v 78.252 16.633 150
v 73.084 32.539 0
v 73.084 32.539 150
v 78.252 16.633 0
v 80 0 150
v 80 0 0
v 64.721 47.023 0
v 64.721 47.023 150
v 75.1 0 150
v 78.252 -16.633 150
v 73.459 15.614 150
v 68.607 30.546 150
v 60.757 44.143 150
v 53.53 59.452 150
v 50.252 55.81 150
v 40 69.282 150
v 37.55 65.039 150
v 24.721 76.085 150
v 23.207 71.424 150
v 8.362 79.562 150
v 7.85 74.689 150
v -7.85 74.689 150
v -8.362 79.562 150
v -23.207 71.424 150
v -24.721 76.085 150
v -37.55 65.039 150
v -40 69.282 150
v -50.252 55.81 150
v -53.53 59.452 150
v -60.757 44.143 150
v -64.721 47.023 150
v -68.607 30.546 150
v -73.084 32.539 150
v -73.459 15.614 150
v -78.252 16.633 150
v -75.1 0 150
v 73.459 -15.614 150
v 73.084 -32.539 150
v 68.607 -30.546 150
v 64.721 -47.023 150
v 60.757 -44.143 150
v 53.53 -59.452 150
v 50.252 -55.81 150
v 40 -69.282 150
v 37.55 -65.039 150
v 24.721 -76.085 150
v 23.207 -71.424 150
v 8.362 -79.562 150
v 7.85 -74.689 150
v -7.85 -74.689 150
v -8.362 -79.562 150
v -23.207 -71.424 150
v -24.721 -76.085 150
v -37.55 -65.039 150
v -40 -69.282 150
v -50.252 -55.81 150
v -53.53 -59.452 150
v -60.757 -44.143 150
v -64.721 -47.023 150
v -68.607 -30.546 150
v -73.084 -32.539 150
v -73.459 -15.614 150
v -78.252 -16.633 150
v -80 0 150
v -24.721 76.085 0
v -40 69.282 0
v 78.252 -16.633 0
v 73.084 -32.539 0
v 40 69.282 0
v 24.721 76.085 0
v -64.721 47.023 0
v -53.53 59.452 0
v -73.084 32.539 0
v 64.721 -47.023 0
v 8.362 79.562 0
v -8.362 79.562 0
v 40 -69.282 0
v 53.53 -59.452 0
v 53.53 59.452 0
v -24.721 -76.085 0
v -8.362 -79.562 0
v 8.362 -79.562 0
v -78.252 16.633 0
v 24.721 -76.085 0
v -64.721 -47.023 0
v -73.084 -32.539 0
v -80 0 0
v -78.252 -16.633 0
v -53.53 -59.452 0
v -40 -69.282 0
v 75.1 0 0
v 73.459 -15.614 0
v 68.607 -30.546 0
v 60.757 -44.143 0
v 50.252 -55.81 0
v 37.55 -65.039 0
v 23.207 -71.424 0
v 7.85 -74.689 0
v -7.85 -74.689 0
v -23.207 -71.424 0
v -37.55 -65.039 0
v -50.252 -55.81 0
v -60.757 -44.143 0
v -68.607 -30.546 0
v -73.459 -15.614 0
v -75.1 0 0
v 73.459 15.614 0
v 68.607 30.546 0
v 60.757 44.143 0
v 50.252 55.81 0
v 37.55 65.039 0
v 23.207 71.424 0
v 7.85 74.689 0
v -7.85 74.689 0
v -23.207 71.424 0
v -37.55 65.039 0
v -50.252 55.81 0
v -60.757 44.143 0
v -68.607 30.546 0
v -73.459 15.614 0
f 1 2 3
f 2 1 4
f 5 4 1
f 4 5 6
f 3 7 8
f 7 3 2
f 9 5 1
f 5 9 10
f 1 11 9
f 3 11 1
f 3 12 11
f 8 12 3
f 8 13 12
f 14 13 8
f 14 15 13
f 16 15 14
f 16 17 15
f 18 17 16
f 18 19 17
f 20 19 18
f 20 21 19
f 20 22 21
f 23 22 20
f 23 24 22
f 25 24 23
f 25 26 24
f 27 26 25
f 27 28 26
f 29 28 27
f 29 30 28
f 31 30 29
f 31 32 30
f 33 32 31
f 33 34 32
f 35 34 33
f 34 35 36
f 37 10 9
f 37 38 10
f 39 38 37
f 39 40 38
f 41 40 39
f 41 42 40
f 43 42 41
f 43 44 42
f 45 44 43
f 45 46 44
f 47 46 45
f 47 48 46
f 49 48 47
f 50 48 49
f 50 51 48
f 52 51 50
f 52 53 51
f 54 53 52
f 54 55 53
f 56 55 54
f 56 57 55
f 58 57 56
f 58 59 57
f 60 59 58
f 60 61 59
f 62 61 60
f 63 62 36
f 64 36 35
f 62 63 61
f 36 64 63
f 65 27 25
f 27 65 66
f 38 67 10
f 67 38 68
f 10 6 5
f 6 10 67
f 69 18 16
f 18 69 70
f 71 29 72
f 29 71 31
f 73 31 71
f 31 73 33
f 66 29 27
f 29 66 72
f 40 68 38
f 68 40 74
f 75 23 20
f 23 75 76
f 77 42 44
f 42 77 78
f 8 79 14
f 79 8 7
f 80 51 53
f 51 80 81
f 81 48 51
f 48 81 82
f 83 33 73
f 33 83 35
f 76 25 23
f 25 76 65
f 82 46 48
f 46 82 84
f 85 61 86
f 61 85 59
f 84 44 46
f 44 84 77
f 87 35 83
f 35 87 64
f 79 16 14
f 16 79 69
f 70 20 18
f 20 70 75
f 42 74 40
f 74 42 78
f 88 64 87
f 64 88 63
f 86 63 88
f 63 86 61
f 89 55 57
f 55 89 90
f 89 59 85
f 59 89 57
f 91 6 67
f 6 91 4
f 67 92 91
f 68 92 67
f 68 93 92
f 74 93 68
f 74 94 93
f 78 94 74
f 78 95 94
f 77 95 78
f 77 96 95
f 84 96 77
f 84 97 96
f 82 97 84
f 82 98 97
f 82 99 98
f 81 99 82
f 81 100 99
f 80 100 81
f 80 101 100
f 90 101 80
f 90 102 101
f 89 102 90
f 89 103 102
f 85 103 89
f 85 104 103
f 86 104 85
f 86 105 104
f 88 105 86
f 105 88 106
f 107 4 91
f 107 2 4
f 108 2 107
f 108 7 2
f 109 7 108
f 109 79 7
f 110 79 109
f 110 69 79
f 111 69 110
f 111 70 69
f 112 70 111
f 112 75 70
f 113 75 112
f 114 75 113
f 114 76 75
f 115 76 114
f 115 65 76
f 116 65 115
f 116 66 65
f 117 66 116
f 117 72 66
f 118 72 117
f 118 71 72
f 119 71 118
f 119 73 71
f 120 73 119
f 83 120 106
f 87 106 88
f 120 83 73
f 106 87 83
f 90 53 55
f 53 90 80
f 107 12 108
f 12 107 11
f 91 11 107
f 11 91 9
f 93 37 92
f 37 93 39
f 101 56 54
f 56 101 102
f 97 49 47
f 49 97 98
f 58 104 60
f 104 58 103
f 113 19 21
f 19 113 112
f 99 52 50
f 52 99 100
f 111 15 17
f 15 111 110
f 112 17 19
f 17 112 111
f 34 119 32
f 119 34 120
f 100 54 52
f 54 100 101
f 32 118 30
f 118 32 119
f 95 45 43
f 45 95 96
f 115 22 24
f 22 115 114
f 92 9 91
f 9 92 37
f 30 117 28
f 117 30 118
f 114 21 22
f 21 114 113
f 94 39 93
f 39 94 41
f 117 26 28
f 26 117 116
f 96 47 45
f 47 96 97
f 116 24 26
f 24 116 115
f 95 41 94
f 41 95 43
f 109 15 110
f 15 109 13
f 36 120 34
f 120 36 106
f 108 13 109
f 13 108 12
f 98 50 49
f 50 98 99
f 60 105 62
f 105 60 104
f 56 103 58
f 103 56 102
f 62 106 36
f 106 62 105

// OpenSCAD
// Parameters
pipe_standard = 1; //[1:1:1]
nominal_size = 160; //[80:320:1]
length_mm = 150; //[75:300:1]
center = 0; //[0:1:1]
ht160_outer_diameter = 160; //[120:200:1]
ht160_wall_thickness = 4.9; //[2.5:10:0.1]
overlap_mm = 1; //[0.5:2:0.1]
bore_radius = 75.1; //[50:95:0.1]

// HT Pipe - complete geometry
module ht_pipe() {
  color([0.85, 0.85, 0.8]) { // PVC color
    difference() {
      // Outer pipe segment
      cylinder(r=ht160_outer_diameter/2, h=length_mm, center=false);
      
      // Inner hollow bore
      translate([0, 0, -overlap_mm])
        cylinder(r=bore_radius, h=length_mm + 2*overlap_mm, center=false);
    }
  }
}

// Assembly
module assembly() {
  ht_pipe();
}

assembly();
